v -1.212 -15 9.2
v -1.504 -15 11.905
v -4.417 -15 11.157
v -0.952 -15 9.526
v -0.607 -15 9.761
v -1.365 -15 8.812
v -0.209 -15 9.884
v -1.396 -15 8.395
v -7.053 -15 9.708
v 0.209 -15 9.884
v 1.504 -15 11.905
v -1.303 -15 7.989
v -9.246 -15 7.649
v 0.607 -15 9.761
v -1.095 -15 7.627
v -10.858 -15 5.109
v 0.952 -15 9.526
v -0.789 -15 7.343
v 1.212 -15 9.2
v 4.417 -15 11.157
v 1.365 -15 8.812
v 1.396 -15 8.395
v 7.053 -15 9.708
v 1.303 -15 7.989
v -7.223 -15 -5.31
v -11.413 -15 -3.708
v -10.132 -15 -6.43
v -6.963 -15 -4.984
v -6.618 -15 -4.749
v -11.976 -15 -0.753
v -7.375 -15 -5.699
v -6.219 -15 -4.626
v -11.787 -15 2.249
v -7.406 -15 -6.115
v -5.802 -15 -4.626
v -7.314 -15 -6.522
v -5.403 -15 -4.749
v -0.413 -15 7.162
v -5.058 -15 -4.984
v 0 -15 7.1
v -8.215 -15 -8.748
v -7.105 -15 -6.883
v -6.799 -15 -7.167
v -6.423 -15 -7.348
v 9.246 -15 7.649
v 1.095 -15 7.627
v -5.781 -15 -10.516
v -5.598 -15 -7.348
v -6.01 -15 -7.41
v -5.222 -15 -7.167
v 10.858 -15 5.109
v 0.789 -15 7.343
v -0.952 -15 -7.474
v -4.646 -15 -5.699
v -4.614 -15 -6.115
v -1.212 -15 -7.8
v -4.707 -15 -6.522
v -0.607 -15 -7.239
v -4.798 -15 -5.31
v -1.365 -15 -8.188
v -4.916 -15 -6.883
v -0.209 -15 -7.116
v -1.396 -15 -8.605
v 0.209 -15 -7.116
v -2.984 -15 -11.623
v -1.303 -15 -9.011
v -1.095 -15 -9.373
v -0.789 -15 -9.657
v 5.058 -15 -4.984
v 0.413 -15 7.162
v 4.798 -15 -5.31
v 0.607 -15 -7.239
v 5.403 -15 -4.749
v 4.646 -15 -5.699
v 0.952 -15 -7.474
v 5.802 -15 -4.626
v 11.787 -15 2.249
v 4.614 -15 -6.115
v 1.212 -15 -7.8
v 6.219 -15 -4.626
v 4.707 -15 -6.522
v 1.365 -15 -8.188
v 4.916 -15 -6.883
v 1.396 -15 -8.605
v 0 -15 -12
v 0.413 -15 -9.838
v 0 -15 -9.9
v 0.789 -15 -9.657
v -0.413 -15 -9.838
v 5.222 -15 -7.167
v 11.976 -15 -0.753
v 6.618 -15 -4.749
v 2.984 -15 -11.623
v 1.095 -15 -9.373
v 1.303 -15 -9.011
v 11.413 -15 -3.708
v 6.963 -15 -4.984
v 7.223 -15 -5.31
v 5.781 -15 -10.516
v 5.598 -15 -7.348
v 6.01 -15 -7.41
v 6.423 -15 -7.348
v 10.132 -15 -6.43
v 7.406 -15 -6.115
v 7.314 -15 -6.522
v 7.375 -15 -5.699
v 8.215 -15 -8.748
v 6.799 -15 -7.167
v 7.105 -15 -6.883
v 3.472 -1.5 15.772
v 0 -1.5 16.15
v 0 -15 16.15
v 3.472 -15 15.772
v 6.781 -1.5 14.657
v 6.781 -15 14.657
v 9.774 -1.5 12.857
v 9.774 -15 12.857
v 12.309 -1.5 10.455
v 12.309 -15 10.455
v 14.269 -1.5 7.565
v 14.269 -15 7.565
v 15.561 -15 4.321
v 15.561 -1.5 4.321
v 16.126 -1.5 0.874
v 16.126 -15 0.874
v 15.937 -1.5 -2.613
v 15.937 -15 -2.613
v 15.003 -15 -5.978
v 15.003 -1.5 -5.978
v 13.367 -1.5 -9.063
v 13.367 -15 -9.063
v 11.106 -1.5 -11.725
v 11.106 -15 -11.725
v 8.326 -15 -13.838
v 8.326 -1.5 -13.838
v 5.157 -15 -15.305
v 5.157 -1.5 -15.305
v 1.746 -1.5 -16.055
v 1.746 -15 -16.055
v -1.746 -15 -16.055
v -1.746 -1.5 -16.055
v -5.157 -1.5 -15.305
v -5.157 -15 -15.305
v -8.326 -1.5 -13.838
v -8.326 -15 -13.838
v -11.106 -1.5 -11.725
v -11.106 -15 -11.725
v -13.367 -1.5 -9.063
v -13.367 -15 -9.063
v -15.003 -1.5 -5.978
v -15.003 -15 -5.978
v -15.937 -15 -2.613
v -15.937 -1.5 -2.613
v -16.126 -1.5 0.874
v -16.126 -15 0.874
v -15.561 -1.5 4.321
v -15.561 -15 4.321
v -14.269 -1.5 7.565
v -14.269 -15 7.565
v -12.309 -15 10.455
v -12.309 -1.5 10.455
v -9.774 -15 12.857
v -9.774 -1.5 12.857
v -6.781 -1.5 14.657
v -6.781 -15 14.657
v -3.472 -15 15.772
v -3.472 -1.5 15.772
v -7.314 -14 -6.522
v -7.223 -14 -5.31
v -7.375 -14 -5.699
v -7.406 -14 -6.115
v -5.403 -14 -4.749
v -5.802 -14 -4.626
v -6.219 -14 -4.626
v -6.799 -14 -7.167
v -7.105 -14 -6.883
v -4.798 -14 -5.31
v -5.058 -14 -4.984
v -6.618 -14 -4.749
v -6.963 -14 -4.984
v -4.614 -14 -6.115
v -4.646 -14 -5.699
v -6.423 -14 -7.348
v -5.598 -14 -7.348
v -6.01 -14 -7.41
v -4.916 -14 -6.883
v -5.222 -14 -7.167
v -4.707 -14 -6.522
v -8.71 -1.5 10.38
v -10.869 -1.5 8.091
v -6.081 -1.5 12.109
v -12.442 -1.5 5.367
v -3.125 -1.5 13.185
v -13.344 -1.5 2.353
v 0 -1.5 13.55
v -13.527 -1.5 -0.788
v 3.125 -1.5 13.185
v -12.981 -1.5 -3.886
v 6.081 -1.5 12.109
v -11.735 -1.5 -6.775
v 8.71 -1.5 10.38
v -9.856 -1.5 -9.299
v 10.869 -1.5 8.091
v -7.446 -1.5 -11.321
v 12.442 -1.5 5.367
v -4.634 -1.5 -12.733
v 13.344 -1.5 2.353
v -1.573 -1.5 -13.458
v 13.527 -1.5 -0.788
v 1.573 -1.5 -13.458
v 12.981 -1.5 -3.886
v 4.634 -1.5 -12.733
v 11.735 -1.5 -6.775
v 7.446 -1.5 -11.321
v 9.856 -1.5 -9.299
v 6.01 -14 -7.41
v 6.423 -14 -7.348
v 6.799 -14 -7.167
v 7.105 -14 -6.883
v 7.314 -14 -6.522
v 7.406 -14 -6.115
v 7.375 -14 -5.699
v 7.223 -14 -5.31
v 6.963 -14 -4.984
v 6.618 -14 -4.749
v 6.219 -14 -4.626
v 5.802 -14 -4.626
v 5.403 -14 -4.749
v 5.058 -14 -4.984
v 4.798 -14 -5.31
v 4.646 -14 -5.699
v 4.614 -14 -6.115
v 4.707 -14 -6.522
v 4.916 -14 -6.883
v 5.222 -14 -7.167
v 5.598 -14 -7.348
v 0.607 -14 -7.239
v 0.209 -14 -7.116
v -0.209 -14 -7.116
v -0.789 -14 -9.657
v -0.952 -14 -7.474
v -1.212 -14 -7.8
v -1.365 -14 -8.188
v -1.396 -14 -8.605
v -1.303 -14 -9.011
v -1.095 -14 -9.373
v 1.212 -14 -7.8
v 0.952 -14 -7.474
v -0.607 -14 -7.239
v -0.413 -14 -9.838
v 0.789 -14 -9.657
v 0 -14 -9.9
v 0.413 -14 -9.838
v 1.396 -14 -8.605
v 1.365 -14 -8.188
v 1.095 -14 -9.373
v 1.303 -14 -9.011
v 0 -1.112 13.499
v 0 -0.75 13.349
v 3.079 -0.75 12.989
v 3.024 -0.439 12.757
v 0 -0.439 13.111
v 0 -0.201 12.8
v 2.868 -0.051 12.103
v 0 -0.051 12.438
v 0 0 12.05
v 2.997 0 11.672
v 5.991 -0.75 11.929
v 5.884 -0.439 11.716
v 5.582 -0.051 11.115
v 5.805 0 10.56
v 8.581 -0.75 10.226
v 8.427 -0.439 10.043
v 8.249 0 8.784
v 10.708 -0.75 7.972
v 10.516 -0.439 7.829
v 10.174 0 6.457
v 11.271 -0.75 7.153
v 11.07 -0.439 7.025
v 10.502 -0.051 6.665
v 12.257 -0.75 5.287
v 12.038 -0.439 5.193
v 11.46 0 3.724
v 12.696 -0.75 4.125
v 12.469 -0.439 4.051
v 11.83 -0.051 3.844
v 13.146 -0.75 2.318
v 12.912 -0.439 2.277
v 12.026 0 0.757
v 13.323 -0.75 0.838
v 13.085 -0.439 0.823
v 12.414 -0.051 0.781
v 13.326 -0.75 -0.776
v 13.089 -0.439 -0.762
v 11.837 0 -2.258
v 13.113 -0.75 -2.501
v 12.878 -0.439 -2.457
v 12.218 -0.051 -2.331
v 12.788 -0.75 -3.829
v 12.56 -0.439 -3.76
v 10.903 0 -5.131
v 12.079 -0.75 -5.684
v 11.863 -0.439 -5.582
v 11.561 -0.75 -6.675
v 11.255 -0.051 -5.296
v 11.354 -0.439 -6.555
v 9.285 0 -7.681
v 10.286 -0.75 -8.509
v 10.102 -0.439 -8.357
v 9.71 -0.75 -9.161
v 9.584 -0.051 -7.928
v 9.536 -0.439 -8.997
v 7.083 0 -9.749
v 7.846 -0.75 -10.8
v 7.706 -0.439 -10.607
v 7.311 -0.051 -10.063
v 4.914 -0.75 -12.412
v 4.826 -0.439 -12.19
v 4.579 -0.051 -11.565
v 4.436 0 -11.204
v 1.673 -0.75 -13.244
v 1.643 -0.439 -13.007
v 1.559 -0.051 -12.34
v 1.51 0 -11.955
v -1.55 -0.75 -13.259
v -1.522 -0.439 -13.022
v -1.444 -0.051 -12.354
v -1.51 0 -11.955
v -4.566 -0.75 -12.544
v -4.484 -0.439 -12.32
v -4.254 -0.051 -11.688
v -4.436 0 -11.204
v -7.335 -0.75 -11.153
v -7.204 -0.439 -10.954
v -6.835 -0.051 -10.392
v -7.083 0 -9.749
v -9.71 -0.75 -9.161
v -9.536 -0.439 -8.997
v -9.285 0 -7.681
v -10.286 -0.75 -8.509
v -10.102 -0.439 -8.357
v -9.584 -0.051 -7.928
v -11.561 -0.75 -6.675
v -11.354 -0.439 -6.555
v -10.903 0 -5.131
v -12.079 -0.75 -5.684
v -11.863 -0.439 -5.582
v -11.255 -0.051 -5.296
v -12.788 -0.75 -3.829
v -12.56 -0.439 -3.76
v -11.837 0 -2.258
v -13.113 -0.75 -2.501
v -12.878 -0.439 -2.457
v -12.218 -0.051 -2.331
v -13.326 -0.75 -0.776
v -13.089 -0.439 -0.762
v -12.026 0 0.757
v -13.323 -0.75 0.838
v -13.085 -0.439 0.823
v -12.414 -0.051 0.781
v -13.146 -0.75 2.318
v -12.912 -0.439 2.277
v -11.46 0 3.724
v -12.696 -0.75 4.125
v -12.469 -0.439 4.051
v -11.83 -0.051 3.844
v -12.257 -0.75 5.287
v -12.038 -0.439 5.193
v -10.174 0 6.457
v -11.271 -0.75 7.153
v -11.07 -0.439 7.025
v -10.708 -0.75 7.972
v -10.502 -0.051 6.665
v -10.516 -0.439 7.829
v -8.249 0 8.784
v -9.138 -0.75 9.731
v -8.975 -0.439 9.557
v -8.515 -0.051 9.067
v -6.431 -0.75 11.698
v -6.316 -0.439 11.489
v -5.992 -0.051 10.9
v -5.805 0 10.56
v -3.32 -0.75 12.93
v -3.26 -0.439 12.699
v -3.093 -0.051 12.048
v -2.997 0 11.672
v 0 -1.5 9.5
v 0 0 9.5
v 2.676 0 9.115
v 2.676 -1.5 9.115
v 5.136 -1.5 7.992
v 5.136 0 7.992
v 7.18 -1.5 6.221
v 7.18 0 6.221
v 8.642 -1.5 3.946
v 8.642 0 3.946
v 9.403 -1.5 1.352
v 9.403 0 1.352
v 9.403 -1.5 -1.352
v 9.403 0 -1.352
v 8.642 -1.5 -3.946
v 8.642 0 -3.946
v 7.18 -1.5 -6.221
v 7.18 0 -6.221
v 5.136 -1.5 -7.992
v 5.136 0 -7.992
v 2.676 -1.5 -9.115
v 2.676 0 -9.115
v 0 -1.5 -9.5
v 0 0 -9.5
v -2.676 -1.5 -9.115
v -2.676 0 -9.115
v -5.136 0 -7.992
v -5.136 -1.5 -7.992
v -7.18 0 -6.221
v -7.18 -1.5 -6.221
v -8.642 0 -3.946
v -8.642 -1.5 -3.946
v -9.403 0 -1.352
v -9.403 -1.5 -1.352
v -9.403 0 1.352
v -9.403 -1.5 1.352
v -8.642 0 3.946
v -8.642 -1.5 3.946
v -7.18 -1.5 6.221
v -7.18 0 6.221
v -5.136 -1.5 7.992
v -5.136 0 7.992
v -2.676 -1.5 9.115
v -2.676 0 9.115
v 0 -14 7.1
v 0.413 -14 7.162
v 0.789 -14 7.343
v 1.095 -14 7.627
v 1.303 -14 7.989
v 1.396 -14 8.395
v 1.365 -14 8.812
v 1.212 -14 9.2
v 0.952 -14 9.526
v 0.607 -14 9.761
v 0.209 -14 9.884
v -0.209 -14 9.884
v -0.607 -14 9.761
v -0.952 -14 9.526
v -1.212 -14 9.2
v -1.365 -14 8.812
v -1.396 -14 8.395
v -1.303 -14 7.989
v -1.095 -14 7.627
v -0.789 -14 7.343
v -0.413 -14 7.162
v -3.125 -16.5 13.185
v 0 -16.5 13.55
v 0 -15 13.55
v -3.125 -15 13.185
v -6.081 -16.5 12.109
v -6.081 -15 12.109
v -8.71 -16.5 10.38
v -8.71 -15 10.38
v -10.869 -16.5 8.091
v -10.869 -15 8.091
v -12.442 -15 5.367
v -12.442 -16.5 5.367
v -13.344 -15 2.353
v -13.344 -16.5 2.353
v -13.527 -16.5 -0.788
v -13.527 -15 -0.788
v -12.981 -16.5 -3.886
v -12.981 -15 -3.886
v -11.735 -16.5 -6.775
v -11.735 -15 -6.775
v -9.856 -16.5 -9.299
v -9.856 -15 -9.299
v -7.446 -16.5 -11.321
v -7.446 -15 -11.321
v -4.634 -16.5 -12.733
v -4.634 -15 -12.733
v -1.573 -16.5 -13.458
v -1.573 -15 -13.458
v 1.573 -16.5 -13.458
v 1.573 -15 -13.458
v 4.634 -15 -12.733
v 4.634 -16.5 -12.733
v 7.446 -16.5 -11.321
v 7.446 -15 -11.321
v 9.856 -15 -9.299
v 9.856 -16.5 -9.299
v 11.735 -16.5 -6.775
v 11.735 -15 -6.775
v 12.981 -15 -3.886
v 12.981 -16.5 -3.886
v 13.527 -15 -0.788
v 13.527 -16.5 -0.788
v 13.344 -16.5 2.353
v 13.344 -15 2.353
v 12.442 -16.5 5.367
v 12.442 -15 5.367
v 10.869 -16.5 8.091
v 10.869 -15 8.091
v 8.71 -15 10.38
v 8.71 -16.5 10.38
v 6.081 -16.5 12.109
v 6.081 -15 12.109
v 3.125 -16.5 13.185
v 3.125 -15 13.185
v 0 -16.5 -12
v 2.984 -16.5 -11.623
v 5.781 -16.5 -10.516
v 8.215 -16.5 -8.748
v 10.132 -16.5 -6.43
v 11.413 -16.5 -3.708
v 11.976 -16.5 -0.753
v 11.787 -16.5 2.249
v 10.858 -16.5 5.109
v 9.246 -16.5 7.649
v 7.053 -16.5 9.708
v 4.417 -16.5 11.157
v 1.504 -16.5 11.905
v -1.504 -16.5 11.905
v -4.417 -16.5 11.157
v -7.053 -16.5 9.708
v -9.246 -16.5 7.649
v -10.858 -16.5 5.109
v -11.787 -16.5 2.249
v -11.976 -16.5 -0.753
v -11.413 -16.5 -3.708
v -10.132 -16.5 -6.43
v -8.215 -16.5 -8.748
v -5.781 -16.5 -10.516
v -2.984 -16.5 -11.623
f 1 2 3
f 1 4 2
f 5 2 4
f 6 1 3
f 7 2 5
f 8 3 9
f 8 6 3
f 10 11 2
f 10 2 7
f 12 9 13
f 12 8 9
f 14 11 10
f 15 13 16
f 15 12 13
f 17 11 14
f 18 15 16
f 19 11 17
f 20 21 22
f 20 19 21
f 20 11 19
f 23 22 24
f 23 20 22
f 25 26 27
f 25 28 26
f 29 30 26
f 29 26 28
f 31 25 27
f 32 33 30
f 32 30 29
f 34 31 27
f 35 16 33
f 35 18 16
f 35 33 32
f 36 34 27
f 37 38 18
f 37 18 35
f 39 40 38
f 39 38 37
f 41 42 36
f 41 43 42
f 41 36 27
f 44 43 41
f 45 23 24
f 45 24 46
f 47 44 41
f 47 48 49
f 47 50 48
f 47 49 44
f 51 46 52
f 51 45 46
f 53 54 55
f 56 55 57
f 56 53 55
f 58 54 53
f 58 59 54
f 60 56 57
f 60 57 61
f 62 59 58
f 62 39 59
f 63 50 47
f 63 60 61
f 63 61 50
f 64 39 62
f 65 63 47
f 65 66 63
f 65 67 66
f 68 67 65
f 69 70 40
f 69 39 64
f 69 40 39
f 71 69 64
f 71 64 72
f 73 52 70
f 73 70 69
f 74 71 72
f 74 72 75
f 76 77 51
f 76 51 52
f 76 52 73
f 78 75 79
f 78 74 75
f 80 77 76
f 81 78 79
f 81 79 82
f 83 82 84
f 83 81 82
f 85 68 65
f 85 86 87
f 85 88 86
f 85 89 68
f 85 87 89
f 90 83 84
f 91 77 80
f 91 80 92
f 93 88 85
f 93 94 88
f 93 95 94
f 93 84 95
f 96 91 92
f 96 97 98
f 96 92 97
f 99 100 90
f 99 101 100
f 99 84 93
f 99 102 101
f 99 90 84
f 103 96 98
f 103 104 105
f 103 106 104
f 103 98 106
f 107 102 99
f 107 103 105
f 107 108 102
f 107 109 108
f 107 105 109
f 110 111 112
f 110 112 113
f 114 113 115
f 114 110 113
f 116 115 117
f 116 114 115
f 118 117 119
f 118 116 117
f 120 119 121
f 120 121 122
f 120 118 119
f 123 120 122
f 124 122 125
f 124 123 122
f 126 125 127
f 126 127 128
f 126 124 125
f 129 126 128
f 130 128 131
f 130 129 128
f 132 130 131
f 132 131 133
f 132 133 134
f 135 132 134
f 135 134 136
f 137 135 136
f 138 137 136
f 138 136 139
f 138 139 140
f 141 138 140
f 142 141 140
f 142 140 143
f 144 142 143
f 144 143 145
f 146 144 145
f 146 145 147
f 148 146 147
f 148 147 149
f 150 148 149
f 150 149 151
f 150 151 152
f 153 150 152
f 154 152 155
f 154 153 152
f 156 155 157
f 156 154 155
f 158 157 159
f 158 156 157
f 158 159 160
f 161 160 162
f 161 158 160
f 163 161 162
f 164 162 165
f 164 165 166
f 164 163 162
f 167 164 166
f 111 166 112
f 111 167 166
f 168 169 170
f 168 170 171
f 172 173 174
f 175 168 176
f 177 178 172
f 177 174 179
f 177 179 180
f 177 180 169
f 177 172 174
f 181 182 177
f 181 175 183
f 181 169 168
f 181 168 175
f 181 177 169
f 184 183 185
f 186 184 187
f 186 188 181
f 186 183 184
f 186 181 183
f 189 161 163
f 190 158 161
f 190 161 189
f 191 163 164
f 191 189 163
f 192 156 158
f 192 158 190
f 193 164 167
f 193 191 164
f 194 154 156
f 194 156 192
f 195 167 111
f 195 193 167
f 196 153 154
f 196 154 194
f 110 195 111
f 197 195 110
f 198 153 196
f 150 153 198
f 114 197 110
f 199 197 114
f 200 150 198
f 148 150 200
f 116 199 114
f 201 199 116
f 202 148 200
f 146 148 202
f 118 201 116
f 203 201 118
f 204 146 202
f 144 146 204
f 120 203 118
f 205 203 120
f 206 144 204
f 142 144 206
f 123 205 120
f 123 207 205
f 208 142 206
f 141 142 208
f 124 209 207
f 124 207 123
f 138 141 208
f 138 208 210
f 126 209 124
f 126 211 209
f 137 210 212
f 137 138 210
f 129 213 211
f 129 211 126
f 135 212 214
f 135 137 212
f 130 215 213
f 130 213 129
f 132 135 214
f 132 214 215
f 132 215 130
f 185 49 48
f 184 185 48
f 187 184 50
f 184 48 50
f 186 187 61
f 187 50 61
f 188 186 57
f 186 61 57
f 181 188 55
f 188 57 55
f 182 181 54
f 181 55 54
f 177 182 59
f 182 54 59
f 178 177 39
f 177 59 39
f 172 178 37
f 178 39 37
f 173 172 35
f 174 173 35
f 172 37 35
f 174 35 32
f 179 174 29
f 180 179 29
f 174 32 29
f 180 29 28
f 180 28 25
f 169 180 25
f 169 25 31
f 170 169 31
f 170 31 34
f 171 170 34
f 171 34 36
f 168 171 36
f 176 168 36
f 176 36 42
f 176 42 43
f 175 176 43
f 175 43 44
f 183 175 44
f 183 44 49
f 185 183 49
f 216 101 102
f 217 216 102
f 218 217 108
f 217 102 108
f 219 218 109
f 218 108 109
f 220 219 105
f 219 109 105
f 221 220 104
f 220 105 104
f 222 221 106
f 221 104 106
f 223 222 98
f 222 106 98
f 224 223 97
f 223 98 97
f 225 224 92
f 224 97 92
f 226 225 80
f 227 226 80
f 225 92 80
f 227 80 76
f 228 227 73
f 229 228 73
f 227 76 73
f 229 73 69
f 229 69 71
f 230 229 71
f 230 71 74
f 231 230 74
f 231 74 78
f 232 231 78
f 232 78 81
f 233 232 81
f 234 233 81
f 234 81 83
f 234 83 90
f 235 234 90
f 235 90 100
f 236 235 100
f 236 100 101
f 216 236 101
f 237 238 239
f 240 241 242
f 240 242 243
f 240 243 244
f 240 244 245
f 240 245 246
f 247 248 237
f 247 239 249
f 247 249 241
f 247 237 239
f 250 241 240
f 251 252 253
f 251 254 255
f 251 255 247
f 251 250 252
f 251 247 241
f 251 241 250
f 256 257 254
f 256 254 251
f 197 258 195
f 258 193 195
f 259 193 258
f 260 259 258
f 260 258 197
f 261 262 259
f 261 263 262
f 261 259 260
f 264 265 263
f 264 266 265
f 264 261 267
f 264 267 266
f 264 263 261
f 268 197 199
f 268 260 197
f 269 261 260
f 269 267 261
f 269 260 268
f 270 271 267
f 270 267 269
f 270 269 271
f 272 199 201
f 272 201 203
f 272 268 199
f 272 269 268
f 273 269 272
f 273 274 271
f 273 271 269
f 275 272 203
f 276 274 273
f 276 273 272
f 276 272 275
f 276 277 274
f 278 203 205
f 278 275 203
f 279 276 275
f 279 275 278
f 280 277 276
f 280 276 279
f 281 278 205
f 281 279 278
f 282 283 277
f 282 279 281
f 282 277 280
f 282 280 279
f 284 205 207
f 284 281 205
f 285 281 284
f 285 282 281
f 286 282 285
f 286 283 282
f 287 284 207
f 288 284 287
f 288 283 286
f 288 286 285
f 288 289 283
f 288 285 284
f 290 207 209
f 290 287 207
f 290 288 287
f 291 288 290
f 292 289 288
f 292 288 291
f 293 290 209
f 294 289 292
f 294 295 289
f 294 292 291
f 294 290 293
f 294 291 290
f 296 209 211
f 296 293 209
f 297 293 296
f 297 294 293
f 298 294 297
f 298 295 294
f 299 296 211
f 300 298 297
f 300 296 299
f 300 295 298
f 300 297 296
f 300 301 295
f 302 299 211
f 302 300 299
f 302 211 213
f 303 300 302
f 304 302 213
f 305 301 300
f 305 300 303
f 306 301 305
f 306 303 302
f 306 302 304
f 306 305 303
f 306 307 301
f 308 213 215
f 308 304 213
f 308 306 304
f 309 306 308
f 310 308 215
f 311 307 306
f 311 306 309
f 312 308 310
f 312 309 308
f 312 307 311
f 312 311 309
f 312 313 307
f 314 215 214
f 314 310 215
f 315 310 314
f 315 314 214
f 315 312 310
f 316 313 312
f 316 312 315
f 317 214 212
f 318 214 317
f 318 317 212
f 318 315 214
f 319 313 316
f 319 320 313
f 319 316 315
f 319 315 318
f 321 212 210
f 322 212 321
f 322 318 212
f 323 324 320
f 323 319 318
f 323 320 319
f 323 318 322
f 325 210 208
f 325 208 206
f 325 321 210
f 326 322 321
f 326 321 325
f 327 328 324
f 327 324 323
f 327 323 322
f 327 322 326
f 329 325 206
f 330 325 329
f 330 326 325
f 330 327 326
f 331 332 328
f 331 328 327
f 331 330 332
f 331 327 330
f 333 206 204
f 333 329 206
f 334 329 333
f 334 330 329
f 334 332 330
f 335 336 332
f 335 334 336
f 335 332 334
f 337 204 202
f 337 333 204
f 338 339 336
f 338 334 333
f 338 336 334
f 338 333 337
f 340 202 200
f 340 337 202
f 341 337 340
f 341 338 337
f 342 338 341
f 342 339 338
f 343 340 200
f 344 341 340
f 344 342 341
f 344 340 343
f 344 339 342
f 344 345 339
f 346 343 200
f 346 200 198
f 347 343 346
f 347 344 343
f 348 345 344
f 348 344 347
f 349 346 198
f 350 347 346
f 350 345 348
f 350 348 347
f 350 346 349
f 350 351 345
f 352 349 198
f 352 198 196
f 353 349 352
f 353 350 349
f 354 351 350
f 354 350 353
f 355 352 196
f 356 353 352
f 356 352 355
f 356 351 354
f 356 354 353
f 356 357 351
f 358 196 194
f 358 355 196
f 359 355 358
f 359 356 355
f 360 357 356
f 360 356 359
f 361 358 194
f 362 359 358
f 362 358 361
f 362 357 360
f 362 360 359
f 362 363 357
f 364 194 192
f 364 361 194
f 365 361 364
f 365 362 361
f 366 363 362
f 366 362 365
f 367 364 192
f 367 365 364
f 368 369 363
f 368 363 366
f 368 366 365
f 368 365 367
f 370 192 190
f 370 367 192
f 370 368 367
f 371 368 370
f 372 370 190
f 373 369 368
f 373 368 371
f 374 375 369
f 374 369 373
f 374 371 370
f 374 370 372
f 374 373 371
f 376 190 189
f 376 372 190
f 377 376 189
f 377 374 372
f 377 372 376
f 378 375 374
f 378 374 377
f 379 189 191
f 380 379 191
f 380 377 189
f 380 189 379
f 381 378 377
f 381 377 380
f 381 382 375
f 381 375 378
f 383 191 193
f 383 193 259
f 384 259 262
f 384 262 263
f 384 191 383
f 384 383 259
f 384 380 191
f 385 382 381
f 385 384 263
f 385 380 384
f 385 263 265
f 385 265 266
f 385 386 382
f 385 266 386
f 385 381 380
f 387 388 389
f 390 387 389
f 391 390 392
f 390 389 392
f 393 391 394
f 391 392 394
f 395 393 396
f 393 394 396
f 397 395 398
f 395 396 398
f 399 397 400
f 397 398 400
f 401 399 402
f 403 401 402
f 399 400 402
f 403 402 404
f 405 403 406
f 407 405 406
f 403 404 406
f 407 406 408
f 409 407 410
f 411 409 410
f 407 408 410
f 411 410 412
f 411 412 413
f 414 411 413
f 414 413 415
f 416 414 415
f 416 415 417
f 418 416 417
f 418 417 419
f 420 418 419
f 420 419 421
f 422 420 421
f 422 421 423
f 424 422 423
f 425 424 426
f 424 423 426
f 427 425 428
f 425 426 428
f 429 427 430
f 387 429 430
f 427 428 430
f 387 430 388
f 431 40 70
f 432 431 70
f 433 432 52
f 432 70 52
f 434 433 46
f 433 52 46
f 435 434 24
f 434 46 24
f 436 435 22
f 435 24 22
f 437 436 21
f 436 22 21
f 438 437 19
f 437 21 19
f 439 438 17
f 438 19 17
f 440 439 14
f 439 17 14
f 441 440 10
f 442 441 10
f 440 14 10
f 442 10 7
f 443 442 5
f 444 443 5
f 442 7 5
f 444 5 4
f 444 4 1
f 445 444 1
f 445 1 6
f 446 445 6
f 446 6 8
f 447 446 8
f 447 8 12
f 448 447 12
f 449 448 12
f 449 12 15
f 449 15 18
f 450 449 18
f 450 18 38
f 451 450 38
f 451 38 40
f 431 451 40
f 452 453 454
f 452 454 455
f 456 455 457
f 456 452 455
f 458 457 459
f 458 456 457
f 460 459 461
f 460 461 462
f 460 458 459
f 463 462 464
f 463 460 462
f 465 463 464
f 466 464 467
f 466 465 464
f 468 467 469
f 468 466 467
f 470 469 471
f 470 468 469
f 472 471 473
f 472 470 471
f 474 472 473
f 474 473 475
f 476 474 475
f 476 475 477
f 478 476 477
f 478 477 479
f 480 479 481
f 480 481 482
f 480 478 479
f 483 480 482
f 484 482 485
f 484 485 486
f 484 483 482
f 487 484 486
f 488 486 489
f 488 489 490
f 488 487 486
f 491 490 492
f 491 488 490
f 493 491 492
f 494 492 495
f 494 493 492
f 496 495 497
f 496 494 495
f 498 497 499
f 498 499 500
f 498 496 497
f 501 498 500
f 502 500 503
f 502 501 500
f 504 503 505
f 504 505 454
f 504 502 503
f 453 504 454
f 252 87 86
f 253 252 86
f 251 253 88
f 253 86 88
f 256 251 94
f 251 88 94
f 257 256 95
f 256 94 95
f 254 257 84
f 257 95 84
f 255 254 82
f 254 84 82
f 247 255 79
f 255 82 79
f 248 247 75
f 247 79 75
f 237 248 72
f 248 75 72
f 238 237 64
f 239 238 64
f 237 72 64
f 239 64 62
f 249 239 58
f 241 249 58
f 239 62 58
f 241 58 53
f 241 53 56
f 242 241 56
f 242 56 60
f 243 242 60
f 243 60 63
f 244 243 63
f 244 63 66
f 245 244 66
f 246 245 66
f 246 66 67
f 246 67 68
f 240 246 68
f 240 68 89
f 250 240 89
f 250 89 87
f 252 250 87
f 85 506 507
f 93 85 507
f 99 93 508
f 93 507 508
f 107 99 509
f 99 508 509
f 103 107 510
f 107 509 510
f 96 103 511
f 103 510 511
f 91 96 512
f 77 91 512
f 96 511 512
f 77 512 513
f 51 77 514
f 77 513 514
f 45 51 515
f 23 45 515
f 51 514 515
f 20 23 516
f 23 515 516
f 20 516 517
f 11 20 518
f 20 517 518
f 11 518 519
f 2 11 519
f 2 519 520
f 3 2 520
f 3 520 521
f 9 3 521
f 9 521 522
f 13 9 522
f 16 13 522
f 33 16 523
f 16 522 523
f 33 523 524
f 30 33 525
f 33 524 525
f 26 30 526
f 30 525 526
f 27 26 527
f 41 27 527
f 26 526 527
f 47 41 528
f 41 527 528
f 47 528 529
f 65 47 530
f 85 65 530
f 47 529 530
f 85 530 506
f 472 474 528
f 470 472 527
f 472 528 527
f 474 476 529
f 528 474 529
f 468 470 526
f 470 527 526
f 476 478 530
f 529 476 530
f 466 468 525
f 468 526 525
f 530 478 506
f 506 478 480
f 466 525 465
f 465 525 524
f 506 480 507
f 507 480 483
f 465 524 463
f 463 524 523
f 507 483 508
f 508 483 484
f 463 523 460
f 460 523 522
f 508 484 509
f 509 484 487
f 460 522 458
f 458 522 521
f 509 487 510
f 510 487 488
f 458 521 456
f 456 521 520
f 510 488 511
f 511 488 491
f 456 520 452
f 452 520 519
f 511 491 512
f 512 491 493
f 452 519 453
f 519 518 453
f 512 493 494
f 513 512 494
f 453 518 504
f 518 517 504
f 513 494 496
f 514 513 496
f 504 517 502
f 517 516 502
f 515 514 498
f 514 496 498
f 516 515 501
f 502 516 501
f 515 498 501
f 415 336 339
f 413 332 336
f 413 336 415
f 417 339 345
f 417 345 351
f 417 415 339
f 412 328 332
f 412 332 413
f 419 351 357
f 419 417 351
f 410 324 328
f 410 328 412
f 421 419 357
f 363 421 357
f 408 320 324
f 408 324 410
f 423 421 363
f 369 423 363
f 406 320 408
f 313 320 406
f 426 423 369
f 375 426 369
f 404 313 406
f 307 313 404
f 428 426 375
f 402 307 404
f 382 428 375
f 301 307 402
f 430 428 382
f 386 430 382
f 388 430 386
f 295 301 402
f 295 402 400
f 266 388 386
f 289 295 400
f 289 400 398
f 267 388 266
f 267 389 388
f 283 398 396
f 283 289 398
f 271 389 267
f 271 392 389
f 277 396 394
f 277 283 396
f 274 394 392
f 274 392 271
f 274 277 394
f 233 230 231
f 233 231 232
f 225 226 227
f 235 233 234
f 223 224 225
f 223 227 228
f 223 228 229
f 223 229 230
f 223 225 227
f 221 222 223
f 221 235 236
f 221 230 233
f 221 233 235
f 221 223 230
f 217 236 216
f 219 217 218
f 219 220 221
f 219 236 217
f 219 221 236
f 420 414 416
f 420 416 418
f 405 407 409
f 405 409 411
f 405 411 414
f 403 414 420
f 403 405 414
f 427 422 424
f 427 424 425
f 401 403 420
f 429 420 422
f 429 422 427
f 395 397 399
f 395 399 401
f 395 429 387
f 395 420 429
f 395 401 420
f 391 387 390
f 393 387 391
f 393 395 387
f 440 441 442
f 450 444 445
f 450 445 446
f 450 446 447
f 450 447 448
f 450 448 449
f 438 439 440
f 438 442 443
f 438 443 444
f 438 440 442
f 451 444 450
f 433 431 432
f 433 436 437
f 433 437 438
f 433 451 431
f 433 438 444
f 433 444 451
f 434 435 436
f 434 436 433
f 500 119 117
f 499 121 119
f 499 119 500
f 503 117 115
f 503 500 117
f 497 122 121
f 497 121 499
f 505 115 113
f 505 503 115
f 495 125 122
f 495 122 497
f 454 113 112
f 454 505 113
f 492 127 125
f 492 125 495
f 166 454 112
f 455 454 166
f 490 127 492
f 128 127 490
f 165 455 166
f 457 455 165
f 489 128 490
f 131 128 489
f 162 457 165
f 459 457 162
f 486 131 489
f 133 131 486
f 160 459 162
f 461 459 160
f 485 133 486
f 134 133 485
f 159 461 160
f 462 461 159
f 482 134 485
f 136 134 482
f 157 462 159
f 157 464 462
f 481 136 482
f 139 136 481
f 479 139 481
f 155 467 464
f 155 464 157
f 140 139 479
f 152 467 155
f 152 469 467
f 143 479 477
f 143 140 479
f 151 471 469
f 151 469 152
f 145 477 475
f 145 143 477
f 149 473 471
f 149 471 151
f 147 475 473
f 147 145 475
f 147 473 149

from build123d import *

# Parameters (mm, degrees)
SKETCH1_R           = 16.15
BOSS_EXTRUDE1_DEPTH = 16.5
SKETCH2_OUTSIDE_W   = 44.014
SKETCH2_OUTSIDE_H   = 44.014
SKETCH2_OUTSIDE_R   = 13.55
CUT_EXTRUDE1_DEPTH  = 1.5
SKETCH3_R           = 9.5
CUT_EXTRUDE2_DEPTH  = 1.5
SKETCH4_OUTSIDE_W   = 44.014
SKETCH4_OUTSIDE_H   = 44.014
SKETCH4_OUTSIDE_R   = 13.55
CUT_EXTRUDE3_DEPTH  = 1.5
SKETCH5_R           = 12
CUT_EXTRUDE4_DEPTH  = 1.5
SKETCH6_R           = 1.4
CUT_EXTRUDE7_DEPTH  = 2.5
FILLET2_R           = 1.5


with BuildPart() as part:
    # Sketch1 → Boss-Extrude1 (new body)
    with BuildSketch(Plane(origin=(0, 0, 0), x_dir=(1, 0, 0), z_dir=(0, 1, 0))):
        with Locations(Location((0, 0, 0), (0, 0, 270))):
            Circle(SKETCH1_R)
    extrude(amount=-BOSS_EXTRUDE1_DEPTH)

    # Sketch2 outside → Cut-Extrude1 (cut)
    with BuildSketch(Plane(origin=(0, 0, 0), x_dir=(1, 0, 0), z_dir=(0, 1, 0))):
        Rectangle(SKETCH2_OUTSIDE_W, SKETCH2_OUTSIDE_H)
        with Locations(Location((0, 0, 0), (0, 0, 270))):
            Circle(SKETCH2_OUTSIDE_R, mode=Mode.SUBTRACT)
    extrude(amount=-CUT_EXTRUDE1_DEPTH, mode=Mode.SUBTRACT)

    # Sketch3 → Cut-Extrude2 (cut)
    with BuildSketch(Plane(origin=(0, 0, 0), x_dir=(1, 0, 0), z_dir=(0, 1, 0))):
        with Locations(Location((0, 0, 0), (0, 0, 270))):
            Circle(SKETCH3_R)
    extrude(amount=-CUT_EXTRUDE2_DEPTH, mode=Mode.SUBTRACT)

    # Sketch4 outside → Cut-Extrude3 (cut)
    with BuildSketch(Plane(origin=(0, -16.5, 0), x_dir=(-1, 0, 0), z_dir=(0, -1, 0))):
        Rectangle(SKETCH4_OUTSIDE_W, SKETCH4_OUTSIDE_H)
        with Locations(Location((0, 0, 0), (0, 0, 270))):
            Circle(SKETCH4_OUTSIDE_R, mode=Mode.SUBTRACT)
    extrude(amount=-CUT_EXTRUDE3_DEPTH, mode=Mode.SUBTRACT)

    # Sketch5 → Cut-Extrude4 (cut)
    with BuildSketch(Plane(origin=(0, -16.5, 0), x_dir=(-1, 0, 0), z_dir=(0, -1, 0))):
        with Locations(Location((0, 0, 0), (0, 0, 90))):
            Circle(SKETCH5_R)
    extrude(amount=-CUT_EXTRUDE4_DEPTH, mode=Mode.SUBTRACT)

    # Sketch6 → Cut-Extrude7 (cut)
    with BuildSketch(Plane(origin=(0, -16.5, 0), x_dir=(-1, 0, 0), z_dir=(0, -1, 0))):
        with Locations(Location((0, 8.5, 0), (0, 0, 90))):
            Circle(SKETCH6_R)
        with Locations(Location((6.01040764, 6.01040764, 0), (0, 0, 90))):
            Circle(SKETCH6_R)
        with Locations(Location((-6.01040764, 6.01040764, 0), (0, 0, 90))):
            Circle(SKETCH6_R)
        with Locations(Location((0, -8.5, 0), (0, 0, 90))):
            Circle(SKETCH6_R)
    extrude(amount=-CUT_EXTRUDE7_DEPTH, mode=Mode.SUBTRACT)

    # Fillet2
    fillet2_edges = [part.edges().sort_by_distance(p)[0] for p in [
        (0, 0, -13.55),
    ]]
    fillet(fillet2_edges, radius=FILLET2_R - 0.0001)  # a hair under: the kernel refuses the full size


solid = part.part
